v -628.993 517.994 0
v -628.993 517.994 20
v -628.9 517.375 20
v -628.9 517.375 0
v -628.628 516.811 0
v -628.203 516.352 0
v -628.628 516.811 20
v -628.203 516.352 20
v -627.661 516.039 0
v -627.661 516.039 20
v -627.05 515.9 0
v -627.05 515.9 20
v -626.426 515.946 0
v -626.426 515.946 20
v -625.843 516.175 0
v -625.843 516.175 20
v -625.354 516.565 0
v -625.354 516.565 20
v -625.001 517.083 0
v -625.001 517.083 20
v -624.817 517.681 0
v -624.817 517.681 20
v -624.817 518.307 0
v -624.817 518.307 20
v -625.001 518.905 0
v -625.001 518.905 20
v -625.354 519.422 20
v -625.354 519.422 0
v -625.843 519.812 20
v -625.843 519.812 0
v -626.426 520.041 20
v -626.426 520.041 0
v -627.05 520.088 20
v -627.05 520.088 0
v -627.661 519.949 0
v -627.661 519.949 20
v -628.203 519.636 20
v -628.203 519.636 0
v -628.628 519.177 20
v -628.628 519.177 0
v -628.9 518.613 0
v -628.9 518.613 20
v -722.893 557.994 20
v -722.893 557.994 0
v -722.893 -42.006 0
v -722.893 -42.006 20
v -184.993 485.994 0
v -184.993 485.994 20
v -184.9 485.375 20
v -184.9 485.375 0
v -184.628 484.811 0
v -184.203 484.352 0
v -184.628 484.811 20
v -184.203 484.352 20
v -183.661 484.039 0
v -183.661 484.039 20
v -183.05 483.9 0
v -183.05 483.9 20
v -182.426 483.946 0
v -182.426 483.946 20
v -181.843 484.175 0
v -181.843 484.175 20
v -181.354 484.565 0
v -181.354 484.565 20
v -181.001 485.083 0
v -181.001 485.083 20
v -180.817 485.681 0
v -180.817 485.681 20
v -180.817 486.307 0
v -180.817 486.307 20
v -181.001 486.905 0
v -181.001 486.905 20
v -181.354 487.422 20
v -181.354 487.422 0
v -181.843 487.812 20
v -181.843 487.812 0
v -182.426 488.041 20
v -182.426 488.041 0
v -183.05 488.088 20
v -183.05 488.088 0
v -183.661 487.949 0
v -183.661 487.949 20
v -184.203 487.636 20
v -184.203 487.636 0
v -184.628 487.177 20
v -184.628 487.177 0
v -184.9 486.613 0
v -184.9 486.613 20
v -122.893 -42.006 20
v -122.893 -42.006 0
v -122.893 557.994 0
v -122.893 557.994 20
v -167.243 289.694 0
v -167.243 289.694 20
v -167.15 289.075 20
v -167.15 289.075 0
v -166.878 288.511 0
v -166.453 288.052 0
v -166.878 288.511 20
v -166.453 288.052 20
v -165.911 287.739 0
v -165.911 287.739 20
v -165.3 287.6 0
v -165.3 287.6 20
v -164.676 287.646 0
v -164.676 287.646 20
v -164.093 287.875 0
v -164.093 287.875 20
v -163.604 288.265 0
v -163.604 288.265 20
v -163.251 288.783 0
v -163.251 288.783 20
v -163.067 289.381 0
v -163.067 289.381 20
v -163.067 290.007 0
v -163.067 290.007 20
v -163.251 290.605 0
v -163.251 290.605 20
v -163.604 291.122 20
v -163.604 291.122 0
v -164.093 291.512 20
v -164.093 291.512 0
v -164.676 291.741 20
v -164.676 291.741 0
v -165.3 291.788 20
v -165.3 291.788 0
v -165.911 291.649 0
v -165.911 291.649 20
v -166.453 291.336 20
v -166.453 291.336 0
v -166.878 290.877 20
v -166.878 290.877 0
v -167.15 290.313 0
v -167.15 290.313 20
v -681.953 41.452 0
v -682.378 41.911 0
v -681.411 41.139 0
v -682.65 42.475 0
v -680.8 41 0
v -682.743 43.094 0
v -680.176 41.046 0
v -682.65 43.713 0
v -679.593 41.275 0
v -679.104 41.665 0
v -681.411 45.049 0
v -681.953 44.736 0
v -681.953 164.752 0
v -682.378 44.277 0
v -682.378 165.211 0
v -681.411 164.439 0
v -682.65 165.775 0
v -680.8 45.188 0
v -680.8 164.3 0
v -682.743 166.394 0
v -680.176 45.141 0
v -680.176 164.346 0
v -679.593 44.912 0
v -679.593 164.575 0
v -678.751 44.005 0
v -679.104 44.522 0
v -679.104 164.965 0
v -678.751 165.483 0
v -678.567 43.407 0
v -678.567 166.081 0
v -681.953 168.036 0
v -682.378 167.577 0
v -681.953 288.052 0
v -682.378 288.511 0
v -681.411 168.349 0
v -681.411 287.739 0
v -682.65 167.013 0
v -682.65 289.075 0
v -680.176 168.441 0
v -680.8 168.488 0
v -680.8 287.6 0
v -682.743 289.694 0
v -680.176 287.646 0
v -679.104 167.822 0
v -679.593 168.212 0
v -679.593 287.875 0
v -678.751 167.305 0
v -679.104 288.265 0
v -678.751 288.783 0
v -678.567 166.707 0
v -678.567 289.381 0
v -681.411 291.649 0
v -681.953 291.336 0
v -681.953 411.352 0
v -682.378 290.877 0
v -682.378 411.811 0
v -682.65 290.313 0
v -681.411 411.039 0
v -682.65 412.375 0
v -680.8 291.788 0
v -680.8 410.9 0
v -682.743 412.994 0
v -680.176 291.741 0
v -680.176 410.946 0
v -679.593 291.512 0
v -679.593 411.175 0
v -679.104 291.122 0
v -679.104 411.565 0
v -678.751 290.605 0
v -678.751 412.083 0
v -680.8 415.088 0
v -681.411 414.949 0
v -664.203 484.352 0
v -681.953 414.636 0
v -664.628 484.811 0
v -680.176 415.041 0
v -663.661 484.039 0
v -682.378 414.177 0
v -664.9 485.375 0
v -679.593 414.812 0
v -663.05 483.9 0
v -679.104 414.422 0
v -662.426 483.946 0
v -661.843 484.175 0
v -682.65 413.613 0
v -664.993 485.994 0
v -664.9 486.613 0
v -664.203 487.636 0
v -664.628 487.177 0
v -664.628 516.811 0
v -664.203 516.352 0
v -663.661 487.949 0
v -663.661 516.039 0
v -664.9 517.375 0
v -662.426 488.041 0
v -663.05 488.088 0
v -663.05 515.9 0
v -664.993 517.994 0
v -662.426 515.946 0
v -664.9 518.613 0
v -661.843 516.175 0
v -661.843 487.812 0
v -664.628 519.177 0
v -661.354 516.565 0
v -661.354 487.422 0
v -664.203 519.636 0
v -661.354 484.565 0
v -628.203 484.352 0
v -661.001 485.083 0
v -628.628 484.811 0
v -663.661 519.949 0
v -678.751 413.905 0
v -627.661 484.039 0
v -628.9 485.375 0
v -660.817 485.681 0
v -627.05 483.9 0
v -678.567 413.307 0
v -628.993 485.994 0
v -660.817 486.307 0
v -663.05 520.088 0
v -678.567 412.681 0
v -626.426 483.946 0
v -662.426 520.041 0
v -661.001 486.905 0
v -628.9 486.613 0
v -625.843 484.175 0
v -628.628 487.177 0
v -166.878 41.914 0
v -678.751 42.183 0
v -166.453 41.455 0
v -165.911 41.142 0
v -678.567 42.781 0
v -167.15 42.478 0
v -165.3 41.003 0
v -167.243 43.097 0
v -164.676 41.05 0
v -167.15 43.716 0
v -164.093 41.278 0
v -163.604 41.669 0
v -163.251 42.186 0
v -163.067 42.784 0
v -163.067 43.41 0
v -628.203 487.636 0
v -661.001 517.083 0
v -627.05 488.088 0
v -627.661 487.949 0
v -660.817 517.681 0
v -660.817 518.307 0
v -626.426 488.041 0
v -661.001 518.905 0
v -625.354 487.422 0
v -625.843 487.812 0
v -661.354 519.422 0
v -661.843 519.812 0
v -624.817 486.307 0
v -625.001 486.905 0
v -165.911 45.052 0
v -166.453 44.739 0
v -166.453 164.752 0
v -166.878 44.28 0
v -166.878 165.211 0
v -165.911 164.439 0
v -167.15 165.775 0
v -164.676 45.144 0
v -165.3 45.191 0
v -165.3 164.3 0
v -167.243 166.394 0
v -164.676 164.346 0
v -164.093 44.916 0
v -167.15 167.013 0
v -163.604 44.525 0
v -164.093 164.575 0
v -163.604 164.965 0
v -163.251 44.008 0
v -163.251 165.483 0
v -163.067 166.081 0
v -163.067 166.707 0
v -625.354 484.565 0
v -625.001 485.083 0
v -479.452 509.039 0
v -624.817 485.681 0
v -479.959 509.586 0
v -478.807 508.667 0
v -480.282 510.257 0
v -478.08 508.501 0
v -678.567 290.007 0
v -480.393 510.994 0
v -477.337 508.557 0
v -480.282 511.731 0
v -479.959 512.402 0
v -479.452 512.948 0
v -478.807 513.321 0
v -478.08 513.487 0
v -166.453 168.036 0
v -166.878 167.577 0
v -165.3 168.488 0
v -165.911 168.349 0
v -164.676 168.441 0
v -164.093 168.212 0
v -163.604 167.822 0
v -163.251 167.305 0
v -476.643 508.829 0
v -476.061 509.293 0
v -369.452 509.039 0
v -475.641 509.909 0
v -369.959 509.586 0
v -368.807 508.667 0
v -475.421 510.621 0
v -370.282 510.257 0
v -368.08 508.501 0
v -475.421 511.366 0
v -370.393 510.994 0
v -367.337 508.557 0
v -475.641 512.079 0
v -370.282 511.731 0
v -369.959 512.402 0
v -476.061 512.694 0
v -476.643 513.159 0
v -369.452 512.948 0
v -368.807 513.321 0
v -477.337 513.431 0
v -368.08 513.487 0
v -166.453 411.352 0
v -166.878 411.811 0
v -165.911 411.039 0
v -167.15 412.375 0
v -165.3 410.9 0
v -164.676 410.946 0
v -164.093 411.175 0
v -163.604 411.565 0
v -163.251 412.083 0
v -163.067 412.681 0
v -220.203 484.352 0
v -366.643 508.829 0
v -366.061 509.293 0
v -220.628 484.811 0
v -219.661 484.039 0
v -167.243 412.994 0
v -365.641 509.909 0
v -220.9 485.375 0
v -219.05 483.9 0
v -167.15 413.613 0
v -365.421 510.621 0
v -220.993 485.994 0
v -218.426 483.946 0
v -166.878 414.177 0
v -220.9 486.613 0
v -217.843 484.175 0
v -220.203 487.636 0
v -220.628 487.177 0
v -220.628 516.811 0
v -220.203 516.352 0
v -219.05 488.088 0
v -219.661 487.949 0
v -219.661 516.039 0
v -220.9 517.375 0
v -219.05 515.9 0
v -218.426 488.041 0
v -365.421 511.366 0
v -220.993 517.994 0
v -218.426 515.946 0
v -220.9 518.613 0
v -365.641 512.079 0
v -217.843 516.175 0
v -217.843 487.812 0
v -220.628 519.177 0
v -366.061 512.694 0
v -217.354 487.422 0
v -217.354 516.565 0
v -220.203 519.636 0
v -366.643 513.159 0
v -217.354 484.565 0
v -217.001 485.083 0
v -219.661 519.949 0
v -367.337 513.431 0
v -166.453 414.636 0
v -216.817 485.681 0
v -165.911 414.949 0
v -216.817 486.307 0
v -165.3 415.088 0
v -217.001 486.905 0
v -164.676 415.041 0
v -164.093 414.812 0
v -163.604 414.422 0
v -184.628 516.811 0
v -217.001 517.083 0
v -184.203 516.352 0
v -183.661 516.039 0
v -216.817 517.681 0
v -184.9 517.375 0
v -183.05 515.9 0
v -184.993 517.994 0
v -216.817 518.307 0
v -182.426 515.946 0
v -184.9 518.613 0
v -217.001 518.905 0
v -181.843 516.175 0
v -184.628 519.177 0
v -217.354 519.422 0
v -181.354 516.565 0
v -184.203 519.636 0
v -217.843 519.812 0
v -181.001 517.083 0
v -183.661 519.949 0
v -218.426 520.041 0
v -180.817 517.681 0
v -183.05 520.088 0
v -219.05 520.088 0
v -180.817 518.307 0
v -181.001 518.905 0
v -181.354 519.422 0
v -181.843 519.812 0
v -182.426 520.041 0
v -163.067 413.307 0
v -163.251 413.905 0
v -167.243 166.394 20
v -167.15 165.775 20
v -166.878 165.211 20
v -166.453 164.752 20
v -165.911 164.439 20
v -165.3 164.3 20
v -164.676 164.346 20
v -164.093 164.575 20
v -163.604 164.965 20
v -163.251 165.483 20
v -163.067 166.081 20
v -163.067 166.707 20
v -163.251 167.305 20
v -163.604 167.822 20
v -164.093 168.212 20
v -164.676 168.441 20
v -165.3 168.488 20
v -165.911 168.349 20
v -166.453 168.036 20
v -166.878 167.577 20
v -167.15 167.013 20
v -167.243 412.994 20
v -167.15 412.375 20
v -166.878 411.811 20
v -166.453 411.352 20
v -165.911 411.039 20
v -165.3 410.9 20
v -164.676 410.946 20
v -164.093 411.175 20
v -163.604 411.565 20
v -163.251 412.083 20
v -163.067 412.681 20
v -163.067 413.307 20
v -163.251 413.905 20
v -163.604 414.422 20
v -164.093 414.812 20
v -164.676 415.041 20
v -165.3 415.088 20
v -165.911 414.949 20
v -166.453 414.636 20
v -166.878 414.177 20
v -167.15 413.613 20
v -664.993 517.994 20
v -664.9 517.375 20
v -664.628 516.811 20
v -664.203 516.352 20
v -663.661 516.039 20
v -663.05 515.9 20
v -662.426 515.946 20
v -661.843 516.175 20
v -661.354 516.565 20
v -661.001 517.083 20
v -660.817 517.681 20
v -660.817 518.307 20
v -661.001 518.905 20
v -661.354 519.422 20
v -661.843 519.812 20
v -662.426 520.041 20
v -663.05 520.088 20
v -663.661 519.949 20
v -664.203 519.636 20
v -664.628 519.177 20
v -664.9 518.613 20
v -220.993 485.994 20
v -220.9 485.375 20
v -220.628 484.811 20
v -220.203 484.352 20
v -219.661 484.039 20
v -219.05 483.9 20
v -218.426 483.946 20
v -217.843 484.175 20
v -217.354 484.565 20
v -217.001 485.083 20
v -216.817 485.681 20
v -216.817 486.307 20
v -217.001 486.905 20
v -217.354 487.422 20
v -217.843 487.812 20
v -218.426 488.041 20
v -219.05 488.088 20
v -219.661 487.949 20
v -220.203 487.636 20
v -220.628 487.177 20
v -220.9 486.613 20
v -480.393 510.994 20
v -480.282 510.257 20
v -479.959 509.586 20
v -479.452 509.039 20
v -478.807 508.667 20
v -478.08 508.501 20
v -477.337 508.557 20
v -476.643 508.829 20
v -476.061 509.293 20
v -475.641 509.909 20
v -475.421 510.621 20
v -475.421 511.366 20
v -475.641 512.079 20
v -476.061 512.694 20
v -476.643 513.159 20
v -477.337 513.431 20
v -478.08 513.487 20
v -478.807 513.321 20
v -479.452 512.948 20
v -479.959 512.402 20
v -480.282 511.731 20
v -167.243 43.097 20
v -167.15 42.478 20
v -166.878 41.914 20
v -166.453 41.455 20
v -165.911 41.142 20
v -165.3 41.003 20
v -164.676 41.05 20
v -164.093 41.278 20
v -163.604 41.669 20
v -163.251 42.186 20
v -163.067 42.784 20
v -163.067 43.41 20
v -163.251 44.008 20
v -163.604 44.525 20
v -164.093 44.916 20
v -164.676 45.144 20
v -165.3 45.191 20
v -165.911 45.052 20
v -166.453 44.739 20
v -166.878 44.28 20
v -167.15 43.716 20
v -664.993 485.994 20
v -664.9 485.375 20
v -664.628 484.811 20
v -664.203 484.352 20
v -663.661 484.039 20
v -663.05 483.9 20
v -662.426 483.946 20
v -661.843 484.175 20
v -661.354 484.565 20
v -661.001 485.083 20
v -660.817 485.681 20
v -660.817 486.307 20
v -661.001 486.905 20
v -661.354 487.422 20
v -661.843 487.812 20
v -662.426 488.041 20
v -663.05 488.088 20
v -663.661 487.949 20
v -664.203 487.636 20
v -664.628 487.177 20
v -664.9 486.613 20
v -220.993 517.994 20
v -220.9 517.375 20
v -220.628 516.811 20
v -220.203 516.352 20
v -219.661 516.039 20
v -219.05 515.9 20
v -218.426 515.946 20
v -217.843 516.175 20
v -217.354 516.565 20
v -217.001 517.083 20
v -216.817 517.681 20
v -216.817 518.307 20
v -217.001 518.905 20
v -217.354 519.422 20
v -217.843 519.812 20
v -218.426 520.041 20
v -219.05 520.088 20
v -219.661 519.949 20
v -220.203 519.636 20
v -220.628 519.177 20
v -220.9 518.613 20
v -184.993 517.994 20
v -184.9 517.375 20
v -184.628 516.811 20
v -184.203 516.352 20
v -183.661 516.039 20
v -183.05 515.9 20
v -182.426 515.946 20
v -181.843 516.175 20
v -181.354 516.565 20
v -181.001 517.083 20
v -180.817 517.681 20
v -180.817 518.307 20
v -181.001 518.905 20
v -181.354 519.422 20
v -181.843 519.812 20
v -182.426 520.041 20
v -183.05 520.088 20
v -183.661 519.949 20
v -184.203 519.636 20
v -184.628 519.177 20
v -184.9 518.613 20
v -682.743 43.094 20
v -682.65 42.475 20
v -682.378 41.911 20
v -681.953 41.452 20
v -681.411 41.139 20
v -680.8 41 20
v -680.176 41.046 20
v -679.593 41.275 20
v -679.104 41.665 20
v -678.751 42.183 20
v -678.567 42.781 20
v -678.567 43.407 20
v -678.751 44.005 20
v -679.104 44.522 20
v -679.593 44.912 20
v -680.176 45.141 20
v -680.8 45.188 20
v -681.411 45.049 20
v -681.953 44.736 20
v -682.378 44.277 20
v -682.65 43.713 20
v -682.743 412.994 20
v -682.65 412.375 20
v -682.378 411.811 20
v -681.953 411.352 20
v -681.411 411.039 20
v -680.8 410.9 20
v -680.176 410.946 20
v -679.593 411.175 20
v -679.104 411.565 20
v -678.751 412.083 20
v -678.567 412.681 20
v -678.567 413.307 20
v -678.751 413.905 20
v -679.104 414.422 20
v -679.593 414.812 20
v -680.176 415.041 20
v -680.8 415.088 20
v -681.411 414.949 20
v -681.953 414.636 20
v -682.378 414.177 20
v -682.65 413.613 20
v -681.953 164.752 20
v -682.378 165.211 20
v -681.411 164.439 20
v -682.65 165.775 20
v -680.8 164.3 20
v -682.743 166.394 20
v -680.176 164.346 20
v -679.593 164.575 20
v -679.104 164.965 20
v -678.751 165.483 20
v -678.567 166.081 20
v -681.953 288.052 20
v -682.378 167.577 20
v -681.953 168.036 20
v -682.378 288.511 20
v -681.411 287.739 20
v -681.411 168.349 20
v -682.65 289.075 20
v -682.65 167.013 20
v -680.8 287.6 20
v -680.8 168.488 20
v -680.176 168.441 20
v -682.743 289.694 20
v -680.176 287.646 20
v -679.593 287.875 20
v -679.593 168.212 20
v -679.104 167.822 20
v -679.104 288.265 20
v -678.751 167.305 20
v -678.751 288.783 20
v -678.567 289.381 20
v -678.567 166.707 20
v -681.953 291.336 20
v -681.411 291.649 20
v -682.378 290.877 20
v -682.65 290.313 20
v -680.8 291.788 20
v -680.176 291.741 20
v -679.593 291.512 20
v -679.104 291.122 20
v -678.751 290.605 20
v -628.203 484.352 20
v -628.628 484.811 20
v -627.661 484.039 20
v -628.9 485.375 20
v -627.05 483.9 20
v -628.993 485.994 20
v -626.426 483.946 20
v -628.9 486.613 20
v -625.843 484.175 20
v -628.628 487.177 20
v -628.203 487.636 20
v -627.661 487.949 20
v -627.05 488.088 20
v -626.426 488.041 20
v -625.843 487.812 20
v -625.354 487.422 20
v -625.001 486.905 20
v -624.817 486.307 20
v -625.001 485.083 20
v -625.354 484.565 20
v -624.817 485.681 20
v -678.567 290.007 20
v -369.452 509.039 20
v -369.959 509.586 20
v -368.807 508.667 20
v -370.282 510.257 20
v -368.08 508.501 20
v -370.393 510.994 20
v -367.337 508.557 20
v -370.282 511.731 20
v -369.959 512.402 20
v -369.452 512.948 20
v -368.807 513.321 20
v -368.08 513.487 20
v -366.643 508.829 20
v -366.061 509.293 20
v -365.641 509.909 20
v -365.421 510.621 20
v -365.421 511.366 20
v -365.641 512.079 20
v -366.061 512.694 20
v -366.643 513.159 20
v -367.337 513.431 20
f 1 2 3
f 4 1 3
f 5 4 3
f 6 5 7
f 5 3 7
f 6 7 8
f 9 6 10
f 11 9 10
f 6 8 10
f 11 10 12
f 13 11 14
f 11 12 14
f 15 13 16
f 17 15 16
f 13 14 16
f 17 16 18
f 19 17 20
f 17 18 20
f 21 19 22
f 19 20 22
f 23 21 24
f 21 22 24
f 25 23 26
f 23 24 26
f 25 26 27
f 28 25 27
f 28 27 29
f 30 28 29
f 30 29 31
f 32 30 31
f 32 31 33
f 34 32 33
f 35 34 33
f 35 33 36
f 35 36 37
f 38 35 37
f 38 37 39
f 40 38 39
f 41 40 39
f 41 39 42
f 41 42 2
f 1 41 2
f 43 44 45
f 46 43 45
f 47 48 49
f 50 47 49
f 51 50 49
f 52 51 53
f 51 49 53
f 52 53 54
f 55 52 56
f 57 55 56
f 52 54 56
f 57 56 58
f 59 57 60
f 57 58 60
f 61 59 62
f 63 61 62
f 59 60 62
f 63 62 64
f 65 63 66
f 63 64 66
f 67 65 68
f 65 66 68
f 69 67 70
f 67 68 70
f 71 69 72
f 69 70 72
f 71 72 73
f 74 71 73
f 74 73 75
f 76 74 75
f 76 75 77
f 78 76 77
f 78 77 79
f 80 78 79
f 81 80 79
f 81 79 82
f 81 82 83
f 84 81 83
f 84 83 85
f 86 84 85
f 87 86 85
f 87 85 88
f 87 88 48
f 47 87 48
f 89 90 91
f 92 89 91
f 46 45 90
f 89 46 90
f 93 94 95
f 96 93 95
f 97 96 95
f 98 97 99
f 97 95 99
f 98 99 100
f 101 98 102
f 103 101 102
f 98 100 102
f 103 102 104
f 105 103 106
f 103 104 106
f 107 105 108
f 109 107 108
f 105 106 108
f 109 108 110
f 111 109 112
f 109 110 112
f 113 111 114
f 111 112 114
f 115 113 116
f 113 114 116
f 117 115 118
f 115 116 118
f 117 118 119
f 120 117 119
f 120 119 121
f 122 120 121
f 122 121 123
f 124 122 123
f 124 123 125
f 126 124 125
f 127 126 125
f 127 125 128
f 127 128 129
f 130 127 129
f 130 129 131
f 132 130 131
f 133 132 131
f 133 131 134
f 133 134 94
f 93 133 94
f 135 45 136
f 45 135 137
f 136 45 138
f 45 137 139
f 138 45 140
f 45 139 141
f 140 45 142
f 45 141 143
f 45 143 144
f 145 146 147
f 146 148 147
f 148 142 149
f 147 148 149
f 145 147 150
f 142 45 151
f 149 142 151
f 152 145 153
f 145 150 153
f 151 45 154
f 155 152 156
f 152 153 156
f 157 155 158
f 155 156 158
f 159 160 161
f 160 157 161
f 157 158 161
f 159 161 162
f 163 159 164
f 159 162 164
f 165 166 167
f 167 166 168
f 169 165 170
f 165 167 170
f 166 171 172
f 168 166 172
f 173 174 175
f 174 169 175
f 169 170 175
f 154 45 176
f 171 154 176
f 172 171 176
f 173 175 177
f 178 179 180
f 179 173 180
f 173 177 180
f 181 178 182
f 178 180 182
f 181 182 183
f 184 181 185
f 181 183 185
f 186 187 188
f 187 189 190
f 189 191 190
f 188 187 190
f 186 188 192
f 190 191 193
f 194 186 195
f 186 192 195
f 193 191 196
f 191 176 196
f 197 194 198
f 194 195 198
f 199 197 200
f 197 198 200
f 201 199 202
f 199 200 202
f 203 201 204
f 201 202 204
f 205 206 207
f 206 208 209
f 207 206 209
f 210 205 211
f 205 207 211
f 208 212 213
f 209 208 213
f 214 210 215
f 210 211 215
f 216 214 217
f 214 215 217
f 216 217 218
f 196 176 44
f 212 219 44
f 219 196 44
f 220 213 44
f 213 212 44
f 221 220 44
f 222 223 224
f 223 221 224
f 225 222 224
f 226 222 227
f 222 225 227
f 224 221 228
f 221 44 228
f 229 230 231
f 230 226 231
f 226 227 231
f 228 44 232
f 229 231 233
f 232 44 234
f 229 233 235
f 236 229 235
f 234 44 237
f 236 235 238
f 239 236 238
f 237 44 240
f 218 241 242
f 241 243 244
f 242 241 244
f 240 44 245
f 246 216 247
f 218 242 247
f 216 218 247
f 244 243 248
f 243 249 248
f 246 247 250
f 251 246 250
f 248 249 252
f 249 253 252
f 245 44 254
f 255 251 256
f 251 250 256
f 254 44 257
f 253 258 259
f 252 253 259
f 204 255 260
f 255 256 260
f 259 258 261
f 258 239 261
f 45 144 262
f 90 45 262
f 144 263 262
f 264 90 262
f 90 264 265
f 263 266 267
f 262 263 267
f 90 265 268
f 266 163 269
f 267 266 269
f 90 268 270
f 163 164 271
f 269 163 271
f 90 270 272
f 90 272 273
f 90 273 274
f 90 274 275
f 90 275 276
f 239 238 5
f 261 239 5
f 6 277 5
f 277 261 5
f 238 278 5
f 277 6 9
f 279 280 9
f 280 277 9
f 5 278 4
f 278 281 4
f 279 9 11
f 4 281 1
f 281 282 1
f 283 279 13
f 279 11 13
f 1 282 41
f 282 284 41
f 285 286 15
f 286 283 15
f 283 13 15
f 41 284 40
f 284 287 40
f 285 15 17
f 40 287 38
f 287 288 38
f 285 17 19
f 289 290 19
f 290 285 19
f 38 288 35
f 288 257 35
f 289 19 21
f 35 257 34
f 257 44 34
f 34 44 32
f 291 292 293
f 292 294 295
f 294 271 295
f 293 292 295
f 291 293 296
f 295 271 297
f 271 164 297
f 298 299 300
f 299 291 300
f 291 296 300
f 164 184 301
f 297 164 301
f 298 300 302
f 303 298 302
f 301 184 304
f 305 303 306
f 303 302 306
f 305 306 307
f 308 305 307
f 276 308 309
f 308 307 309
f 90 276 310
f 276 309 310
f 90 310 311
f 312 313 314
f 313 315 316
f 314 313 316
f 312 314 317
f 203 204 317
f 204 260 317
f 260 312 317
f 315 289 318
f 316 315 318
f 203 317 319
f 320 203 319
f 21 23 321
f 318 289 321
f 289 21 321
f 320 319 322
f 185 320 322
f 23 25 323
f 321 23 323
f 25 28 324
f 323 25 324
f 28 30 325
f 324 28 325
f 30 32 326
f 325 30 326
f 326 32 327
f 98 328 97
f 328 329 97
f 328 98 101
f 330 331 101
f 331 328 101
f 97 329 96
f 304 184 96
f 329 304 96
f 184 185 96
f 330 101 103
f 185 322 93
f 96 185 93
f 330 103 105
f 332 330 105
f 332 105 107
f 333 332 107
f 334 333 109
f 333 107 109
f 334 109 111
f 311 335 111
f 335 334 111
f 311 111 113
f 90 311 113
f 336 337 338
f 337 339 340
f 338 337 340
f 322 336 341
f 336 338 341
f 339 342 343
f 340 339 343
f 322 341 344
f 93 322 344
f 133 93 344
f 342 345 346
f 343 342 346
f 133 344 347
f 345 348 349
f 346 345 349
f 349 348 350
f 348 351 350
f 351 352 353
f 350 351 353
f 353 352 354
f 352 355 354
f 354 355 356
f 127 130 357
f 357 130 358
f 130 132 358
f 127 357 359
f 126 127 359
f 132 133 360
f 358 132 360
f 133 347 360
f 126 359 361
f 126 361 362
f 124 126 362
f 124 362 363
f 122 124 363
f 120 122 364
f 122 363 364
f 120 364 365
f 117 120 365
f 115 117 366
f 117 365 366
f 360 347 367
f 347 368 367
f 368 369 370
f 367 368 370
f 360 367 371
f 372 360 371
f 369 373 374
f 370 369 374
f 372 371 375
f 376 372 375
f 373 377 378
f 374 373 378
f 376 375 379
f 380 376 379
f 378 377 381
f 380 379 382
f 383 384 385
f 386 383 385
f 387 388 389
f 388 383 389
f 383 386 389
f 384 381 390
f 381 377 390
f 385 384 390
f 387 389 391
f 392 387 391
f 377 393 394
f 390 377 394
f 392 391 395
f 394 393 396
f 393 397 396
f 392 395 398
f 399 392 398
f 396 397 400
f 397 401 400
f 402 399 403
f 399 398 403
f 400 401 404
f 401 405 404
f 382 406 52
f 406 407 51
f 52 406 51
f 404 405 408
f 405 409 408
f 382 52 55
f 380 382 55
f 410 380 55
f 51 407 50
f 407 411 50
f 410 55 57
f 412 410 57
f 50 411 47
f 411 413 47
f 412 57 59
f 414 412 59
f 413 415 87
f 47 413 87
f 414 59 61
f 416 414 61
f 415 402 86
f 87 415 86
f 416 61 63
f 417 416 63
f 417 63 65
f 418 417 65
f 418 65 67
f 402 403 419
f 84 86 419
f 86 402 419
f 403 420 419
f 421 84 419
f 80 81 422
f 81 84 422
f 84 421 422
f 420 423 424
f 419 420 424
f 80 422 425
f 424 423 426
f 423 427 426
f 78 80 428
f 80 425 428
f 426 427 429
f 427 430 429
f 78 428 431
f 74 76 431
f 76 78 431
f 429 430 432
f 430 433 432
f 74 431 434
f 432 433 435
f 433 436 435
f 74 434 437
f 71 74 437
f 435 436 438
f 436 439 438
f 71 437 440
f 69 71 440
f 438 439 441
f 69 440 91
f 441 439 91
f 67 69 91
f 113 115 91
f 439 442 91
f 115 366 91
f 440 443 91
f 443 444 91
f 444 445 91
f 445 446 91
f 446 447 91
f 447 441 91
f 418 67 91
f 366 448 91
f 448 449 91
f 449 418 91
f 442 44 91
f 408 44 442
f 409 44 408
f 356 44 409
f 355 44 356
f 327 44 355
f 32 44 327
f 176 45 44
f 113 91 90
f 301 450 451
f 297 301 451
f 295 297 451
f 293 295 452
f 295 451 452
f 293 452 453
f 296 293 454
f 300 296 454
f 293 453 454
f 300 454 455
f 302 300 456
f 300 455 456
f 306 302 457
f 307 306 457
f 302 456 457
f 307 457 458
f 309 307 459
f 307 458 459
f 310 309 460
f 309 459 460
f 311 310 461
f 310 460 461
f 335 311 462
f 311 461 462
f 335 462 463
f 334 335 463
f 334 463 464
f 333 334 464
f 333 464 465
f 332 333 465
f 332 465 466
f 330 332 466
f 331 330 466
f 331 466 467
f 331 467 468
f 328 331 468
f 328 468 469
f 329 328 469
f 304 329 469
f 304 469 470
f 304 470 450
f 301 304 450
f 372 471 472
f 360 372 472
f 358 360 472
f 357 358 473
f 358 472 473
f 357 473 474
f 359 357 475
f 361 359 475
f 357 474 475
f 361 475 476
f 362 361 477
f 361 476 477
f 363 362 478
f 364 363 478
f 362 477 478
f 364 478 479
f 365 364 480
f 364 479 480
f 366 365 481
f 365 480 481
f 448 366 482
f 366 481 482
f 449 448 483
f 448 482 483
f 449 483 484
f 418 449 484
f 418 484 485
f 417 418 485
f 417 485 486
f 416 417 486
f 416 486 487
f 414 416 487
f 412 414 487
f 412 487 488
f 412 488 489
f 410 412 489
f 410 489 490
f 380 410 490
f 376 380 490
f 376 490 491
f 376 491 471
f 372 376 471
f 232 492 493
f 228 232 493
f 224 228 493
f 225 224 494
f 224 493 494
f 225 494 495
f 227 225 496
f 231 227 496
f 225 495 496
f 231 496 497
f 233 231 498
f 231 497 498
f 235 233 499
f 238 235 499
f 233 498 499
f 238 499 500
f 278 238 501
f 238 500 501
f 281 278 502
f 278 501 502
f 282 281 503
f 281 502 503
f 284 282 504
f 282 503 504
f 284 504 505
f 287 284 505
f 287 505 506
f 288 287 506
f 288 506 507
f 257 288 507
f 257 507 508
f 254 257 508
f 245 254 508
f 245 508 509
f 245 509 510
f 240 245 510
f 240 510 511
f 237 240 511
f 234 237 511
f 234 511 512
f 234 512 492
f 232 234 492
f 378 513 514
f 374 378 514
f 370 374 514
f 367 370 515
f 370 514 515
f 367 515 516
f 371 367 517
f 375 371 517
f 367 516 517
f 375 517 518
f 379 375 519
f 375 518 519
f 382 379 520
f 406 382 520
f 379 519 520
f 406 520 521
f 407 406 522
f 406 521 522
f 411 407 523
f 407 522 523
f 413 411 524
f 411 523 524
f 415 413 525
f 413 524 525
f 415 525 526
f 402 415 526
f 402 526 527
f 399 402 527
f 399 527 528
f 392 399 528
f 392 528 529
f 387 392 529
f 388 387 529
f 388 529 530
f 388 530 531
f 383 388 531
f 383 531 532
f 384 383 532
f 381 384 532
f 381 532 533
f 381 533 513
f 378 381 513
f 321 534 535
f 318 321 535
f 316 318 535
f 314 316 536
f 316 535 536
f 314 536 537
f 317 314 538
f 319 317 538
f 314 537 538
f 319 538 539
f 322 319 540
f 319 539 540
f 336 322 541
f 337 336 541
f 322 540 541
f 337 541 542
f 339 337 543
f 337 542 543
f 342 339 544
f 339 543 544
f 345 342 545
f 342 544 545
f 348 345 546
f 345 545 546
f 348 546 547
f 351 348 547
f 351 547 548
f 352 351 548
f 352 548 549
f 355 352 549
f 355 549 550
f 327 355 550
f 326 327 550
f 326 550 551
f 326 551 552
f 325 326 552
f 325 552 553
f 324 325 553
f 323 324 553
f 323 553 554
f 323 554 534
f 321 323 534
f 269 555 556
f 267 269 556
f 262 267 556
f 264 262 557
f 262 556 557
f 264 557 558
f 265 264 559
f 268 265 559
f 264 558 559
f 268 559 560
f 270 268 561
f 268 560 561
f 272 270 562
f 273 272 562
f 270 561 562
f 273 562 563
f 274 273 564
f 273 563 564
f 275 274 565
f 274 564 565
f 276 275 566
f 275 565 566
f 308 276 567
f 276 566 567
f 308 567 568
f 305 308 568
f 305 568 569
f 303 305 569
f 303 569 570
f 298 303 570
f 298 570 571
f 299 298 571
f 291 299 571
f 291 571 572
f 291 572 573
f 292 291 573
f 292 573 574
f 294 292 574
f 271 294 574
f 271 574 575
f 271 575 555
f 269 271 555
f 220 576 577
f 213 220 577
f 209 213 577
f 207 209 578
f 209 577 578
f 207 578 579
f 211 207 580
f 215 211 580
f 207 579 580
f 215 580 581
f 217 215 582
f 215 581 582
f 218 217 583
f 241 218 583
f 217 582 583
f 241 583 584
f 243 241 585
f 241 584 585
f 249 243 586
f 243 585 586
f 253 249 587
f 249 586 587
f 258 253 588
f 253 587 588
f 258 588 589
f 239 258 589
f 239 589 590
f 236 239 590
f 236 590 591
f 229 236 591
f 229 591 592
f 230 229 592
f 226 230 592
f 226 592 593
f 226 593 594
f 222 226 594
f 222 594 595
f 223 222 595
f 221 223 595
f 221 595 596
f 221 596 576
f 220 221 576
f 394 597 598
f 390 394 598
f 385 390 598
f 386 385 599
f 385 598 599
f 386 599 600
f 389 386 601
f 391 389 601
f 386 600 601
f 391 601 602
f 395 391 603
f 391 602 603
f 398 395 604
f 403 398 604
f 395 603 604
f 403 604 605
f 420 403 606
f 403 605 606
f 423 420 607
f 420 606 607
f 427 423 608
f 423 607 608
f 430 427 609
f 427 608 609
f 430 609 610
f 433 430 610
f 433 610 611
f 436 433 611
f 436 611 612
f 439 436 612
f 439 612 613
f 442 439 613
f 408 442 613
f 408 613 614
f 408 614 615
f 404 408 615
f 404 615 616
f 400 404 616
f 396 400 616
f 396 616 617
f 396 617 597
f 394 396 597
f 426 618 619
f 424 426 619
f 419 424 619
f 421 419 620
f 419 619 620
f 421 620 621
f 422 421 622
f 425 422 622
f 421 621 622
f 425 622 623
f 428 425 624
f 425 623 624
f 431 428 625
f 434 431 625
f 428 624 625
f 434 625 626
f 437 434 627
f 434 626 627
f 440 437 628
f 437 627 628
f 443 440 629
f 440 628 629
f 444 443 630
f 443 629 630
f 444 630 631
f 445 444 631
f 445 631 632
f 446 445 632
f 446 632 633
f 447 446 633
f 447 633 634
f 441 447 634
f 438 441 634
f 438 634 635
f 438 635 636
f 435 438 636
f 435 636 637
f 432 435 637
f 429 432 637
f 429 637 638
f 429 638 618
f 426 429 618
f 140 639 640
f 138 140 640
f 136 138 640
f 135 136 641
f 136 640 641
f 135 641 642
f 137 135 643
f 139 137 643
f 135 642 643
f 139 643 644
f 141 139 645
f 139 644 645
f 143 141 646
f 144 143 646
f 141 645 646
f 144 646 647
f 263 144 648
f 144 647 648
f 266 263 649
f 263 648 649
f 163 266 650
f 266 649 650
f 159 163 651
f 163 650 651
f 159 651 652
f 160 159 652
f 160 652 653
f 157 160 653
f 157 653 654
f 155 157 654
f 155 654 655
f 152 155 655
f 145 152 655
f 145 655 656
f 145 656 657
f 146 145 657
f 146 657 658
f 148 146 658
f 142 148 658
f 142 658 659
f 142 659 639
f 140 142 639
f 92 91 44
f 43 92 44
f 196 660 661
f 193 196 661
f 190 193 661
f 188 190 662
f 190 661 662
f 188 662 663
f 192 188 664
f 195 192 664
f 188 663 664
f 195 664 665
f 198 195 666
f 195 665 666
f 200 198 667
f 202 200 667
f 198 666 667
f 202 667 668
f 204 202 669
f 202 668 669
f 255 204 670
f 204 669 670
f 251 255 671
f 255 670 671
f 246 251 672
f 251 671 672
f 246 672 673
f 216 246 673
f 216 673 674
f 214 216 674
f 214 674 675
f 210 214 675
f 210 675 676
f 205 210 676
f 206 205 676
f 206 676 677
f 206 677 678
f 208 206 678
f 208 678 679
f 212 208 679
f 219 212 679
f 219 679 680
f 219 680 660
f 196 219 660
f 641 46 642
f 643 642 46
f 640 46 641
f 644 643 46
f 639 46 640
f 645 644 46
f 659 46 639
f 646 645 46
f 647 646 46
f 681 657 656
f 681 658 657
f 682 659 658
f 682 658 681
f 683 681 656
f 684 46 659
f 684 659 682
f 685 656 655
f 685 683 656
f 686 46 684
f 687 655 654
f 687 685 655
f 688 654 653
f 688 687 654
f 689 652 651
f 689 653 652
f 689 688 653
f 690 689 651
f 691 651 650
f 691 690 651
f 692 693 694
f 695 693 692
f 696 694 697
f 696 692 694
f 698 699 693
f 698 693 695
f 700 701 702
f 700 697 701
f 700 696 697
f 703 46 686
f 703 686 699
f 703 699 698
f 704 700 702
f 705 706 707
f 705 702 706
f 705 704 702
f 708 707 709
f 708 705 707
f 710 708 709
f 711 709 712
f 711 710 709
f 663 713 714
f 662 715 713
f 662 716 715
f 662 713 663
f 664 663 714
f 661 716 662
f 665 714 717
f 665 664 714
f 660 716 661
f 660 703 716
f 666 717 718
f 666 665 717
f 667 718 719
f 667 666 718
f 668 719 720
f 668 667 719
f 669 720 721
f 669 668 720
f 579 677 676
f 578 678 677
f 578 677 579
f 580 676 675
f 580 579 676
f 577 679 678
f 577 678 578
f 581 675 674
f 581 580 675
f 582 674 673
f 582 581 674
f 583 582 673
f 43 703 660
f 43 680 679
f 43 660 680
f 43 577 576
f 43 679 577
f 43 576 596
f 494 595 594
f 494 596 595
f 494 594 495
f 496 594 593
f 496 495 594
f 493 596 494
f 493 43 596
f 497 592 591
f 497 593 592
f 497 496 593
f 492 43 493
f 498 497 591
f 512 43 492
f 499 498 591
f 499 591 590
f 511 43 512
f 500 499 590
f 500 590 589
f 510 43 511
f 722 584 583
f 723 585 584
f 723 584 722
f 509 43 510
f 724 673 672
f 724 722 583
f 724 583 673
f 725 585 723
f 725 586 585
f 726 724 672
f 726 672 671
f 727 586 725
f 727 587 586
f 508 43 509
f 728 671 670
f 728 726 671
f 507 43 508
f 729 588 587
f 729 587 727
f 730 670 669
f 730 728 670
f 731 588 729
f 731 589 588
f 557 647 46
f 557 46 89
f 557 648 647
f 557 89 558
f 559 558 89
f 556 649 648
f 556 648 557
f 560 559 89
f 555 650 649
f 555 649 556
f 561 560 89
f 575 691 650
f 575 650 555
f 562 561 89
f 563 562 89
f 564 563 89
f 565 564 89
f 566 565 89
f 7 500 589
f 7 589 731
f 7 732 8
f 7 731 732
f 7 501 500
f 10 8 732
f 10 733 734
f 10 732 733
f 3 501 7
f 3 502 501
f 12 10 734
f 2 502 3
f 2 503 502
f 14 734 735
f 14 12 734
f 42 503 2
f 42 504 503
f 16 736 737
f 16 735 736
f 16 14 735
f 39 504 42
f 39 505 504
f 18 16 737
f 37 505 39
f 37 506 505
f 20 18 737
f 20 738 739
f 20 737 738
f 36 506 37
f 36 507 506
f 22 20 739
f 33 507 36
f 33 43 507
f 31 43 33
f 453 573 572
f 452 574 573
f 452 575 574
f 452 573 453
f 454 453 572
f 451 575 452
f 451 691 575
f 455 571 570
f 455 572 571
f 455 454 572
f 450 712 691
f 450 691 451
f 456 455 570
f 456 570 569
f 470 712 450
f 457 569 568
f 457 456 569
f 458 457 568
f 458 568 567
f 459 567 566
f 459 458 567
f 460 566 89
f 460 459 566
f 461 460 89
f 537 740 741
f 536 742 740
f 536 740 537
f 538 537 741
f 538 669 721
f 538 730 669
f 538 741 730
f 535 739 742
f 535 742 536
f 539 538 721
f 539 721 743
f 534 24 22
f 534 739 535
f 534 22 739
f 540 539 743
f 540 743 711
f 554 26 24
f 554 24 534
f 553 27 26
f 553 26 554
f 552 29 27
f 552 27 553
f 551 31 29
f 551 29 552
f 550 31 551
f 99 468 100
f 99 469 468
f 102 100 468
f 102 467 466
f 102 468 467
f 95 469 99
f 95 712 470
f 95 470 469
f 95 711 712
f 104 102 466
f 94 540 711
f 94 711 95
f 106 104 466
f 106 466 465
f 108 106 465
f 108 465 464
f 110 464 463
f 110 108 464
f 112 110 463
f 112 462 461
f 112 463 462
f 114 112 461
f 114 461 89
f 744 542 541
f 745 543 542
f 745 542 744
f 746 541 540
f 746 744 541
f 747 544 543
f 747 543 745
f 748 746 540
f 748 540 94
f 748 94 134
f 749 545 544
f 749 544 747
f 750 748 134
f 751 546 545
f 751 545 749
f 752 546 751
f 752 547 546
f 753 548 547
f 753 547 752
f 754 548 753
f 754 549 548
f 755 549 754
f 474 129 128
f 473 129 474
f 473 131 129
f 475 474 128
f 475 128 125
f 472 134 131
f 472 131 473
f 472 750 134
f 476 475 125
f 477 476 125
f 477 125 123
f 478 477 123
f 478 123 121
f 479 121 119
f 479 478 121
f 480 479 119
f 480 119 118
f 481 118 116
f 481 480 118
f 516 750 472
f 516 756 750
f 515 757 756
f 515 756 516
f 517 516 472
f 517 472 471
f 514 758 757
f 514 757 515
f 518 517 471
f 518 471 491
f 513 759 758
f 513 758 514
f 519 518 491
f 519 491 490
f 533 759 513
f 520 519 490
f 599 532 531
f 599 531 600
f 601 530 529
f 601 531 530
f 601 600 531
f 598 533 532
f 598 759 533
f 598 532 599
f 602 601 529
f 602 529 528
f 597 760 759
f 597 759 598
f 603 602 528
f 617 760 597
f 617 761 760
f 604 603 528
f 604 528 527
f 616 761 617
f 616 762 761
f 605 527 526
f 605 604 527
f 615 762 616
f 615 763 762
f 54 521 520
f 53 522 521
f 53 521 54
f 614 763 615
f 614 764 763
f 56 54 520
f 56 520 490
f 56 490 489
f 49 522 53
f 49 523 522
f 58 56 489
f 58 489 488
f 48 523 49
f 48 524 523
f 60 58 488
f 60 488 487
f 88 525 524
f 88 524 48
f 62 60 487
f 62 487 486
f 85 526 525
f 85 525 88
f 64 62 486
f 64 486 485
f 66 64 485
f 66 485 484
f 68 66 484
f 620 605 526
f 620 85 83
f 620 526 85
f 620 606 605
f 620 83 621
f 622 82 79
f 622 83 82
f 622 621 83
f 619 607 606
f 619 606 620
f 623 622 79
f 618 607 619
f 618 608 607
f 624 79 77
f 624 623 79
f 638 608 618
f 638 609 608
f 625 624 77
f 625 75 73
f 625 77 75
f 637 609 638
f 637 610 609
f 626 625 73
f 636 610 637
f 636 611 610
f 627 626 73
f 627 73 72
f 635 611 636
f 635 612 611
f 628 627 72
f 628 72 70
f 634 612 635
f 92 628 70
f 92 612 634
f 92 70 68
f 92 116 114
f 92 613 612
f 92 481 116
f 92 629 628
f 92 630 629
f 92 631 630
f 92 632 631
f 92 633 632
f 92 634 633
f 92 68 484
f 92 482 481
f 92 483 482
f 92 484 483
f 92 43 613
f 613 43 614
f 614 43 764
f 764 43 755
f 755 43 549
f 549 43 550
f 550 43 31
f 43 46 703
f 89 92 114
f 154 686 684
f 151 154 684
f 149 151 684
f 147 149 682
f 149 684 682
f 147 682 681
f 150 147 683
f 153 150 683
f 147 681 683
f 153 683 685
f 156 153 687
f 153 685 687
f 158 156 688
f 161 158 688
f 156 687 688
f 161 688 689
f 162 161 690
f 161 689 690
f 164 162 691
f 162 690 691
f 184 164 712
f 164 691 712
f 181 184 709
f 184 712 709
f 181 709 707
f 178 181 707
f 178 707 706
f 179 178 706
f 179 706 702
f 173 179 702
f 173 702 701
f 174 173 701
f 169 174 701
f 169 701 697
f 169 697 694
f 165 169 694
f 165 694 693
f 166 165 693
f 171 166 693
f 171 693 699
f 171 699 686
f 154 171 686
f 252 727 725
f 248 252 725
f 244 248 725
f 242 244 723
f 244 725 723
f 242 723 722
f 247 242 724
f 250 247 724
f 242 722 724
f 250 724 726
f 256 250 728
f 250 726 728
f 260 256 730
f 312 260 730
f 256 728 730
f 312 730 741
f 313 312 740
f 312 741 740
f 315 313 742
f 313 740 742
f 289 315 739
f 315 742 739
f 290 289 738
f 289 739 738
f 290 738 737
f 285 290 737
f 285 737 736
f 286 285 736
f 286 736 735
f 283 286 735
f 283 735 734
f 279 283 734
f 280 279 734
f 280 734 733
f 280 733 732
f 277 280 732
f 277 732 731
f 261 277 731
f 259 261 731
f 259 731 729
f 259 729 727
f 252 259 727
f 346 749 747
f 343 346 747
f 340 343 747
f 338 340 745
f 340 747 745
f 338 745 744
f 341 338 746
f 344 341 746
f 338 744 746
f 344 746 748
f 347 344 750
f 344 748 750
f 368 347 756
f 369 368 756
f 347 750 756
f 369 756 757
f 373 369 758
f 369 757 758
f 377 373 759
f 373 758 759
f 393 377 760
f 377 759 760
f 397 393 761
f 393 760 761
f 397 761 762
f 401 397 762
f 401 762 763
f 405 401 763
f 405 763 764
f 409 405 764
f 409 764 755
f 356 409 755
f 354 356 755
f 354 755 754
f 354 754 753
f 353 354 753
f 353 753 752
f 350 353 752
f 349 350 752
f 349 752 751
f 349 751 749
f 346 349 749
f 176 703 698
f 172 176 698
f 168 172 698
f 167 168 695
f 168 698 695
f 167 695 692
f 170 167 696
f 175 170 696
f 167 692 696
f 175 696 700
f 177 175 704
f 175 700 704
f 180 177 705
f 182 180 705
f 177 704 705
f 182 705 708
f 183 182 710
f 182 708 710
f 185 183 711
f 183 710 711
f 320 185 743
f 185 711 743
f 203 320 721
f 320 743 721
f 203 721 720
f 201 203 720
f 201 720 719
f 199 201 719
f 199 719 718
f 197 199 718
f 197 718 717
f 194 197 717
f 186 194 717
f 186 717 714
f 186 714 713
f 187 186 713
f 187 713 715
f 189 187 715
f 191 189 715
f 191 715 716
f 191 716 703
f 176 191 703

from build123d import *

# Parameters (mm, degrees)
F1_DEPTH = 20
F2_D     = 5
F3_D     = 4.2
F4_D     = 4.2


with BuildPart() as f1:
    # F0 (on Top) → F1 (new body)
    with BuildSketch(Plane.XY):
        Polygon((-122.8932932019, 557.9938352108), (-722.8932932019, 557.9938352108), (-722.8932932019, -42.0061647892), (-422.8932932019, -42.0061647892), (-122.8932932019, -42.0061647892), align=None)
    extrude(amount=F1_DEPTH)

    # F2 (through all)
    with Locations(Plane(origin=(0, 0, 0), x_dir=(1, 0, 0), z_dir=(0, 0, -1))):
        with Locations((-477.8932932019, -510.9938352108), (-367.8932932019, -510.9938352108)):
            Hole(F2_D / 2)

    # F3 (through all)
    with Locations(Plane(origin=(0, 0, 0), x_dir=(1, 0, 0), z_dir=(0, 0, -1))):
        with Locations((-680.6432932019, -412.9938352108), (-680.6432932019, -289.6938352108), (-680.6432932019, -166.3938352108), (-680.6432932019, -43.0938352108), (-165.1432932019, -43.0969782174), (-165.1432932019, -166.3938352108), (-165.1432932019, -289.6938352108), (-165.1432932019, -412.9938352108)):
            Hole(F3_D / 2)

    # F4 (through all)
    with Locations(Plane(origin=(0, 0, 0), x_dir=(1, 0, 0), z_dir=(0, 0, -1))):
        with Locations((-626.8932932019, -485.9938352108), (-662.8932932019, -485.9938352108), (-662.8932932019, -517.9938352108), (-626.8932932019, -517.9938352108), (-218.8932932019, -517.9938352108), (-182.8932932019, -517.9938352108), (-182.8932932019, -485.9938352108), (-218.8932932019, -485.9938352108)):
            Hole(F4_D / 2)


solid = f1.part
